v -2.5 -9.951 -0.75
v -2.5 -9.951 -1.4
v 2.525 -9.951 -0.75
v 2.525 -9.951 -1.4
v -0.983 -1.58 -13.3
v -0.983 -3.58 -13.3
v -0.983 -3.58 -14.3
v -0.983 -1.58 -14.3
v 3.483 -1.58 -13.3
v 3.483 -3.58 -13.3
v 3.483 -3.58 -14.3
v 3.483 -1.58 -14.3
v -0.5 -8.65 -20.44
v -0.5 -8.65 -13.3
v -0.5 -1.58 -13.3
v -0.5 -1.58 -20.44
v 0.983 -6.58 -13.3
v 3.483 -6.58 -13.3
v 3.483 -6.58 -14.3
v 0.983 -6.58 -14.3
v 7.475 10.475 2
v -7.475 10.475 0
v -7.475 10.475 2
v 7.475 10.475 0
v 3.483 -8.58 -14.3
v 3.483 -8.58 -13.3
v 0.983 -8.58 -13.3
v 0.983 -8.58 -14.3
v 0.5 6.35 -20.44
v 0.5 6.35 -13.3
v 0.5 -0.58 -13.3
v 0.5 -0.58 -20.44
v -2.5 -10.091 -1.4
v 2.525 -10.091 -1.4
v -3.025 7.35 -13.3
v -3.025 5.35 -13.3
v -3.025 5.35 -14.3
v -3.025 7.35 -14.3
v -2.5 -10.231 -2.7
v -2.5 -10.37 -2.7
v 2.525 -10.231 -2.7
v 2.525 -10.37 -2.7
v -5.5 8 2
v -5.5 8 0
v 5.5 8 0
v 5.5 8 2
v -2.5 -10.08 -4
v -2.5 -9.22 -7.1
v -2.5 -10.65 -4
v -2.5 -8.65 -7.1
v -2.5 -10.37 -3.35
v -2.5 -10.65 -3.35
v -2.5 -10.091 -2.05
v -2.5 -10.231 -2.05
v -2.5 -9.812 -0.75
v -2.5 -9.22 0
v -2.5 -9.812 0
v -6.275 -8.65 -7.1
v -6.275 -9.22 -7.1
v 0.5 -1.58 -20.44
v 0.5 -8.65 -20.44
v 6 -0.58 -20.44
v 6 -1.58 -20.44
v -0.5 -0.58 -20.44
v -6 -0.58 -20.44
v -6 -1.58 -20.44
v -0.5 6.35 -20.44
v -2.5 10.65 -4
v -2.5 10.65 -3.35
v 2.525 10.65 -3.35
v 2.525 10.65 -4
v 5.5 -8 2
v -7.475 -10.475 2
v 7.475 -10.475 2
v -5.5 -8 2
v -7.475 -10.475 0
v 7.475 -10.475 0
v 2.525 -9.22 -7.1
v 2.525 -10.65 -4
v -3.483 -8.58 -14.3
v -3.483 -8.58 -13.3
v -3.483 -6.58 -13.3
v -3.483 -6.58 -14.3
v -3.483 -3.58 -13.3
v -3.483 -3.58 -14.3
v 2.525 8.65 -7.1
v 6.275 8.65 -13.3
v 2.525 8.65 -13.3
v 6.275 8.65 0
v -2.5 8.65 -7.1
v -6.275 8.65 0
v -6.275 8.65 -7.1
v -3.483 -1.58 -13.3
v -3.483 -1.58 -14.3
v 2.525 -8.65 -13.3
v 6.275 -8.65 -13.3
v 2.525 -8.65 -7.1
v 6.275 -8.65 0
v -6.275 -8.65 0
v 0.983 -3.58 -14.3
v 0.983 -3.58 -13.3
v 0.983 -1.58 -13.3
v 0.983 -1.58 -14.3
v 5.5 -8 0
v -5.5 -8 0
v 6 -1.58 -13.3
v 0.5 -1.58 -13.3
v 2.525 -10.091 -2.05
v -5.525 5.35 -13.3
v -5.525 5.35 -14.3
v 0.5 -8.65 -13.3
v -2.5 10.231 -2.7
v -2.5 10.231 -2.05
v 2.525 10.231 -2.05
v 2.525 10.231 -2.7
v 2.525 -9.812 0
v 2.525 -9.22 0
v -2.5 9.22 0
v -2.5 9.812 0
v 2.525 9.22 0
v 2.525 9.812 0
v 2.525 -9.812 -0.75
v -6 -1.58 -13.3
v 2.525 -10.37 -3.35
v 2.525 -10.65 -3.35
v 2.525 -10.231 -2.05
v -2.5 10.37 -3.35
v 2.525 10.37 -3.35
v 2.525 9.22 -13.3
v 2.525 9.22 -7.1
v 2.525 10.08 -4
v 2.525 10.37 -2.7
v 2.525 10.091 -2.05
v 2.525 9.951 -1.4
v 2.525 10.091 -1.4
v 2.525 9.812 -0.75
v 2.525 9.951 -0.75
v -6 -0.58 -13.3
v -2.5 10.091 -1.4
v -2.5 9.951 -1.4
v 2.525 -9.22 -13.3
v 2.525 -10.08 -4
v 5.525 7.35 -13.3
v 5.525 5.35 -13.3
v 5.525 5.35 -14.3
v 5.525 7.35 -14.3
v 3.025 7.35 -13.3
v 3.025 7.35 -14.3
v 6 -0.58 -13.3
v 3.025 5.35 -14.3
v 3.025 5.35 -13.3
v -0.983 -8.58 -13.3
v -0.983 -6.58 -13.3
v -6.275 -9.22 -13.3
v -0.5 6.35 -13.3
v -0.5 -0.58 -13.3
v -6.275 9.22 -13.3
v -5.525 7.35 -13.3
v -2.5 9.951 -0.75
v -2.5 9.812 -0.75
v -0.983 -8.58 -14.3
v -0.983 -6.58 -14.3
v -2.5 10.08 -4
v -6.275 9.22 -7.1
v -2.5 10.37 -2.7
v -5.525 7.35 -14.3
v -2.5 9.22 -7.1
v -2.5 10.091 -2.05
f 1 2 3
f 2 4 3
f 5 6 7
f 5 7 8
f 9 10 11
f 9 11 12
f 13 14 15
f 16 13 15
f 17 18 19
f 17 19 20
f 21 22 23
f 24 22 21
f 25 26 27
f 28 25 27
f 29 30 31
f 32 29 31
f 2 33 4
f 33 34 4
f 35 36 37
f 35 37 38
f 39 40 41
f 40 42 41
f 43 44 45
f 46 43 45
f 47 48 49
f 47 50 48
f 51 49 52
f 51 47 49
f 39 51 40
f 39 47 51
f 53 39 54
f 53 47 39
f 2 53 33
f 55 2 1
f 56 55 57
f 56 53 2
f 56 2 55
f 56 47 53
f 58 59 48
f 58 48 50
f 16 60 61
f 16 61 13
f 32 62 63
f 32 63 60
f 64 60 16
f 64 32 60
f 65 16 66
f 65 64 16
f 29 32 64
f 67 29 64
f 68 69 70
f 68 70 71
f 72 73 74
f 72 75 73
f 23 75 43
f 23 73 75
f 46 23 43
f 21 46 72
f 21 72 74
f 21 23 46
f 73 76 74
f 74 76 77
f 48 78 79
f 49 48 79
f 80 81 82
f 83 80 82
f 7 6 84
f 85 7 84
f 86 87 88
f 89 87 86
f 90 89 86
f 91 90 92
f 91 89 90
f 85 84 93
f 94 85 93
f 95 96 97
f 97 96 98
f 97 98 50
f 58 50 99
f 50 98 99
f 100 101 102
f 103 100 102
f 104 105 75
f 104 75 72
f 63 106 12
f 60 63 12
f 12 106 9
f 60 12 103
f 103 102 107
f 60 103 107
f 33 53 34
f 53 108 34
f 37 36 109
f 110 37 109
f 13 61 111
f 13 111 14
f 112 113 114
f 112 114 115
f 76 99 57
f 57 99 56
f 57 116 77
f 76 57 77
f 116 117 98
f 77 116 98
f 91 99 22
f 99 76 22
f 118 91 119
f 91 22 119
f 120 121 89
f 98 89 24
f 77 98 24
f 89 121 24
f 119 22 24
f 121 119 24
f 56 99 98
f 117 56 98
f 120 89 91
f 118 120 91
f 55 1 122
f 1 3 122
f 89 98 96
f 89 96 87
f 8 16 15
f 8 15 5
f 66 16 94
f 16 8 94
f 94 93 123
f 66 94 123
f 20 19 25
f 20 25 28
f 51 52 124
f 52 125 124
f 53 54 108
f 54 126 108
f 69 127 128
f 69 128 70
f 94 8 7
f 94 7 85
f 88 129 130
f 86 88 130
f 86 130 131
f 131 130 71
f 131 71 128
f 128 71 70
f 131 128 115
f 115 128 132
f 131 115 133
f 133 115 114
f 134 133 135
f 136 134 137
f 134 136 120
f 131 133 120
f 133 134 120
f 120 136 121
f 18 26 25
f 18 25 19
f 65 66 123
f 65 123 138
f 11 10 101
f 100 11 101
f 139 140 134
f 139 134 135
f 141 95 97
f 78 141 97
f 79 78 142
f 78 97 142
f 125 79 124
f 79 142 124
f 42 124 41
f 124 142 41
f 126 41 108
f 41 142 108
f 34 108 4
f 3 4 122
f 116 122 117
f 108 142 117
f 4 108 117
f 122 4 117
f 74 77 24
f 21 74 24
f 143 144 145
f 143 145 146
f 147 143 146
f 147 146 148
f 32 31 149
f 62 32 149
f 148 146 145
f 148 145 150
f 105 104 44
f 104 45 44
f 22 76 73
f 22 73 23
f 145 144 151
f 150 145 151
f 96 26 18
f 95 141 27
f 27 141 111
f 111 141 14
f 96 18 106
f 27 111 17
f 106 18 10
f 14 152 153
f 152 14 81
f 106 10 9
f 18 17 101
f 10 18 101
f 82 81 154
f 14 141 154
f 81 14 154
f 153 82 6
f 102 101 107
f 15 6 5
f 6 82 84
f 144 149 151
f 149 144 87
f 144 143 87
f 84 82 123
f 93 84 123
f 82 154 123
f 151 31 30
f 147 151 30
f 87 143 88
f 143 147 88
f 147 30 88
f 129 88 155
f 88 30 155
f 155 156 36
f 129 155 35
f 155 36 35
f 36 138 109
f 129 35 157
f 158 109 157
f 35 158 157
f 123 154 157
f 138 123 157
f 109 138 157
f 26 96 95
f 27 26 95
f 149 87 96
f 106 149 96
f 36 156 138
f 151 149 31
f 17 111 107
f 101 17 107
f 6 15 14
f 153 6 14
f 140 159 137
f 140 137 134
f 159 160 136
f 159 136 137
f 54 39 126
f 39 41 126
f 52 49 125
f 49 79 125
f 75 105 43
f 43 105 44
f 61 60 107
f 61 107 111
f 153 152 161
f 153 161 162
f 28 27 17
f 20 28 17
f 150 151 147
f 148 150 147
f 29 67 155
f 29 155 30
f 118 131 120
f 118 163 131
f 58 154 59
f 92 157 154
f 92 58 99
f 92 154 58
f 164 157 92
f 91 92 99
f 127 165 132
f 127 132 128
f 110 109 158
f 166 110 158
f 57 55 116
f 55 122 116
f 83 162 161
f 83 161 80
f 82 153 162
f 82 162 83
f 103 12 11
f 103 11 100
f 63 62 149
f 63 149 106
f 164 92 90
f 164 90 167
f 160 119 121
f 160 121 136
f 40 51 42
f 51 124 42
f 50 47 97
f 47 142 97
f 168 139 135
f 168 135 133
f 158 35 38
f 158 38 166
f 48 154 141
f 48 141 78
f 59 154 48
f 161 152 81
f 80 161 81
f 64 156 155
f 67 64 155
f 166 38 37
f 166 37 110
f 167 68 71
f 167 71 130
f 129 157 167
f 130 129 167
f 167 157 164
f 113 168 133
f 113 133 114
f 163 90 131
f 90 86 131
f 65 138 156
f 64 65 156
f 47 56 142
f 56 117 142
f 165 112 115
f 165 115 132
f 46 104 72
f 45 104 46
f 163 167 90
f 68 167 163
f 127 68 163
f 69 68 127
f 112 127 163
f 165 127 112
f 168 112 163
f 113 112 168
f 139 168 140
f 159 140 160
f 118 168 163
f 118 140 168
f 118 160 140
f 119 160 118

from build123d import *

# Parameters (mm, degrees)
SKETCH1_W                = 14.95
SKETCH1_H                = 20.95
SKETCH1_W_2              = 11
SKETCH1_H_2              = 16
BOSS_EXTRUDE1_DEPTH      = 2
SKETCH2_W                = 12.55
SKETCH2_H                = 17.3
BOSS_EXTRUDE2_DEPTH      = 13.3
SKETCH3_W                = 6.2
SKETCH3_H                = 18.44
BOSS_EXTRUDE3_DEPTH      = 8.8
BOSS_EXTRUDE4_DEPTH      = 2.525
BOSS_EXTRUDE4_DEPTH_BACK = 2.5
BOSS_EXTRUDE5_DEPTH      = 7.14
SKETCH6_W                = 2.5
SKETCH6_H                = 2
BOSS_EXTRUDE6_DEPTH      = 1


with BuildPart() as part:
    # Sketch1 → Boss-Extrude1 (new body)
    with BuildSketch(Plane.XY):
        Rectangle(SKETCH1_W, SKETCH1_H)
        Rectangle(SKETCH1_W_2, SKETCH1_H_2, mode=Mode.SUBTRACT)
    extrude(amount=BOSS_EXTRUDE1_DEPTH)

    # Sketch2 → Boss-Extrude2 (add)
    with BuildSketch(Plane(origin=(0, 0, 0), x_dir=(-1, 0, 0), z_dir=(0, 0, -1))):
        Rectangle(SKETCH2_W, SKETCH2_H)
    extrude(amount=BOSS_EXTRUDE2_DEPTH)

    # Sketch3 → Boss-Extrude3 (add)
    with BuildSketch(Plane.ZY.offset(6.275)):
        with Locations((-10.2, 0)):
            Rectangle(SKETCH3_W, SKETCH3_H)
    extrude(amount=-BOSS_EXTRUDE3_DEPTH)

    # Sketch4 → Boss-Extrude4 (add, two sides)
    with BuildSketch(Plane(origin=(0, 0, 0), x_dir=(0, 0, -1), z_dir=(1, 0, 0))) as boss_extrude4_sk:
        Polygon((7.1, -9.22), (4, -10.65), (3.35, -10.65), (3.35, -10.3705), (2.7, -10.3705), (2.7, -10.23075), (2.05, -10.23075), (2.05, -10.091), (1.4, -10.091), (1.4, -9.95125), (0.75, -9.95125), (0.75, -9.8115), (0, -9.8115), (0, -9.22), (4, -10.08), (7.1, -8.65), align=None)
        Polygon((7.1, 9.22), (7.1, 8.65), (4, 10.08), (0, 9.22), (0, 9.8115), (0.75, 9.8115), (0.75, 9.95125), (1.4, 9.95125), (1.4, 10.091), (2.05, 10.091), (2.05, 10.23075), (2.7, 10.23075), (2.7, 10.3705), (3.35, 10.3705), (3.35, 10.65), (4, 10.65), align=None)
    extrude(amount=BOSS_EXTRUDE4_DEPTH)
    extrude(boss_extrude4_sk.sketch, amount=-BOSS_EXTRUDE4_DEPTH_BACK)

    # Sketch5 → Boss-Extrude5 (add)
    with BuildSketch(Plane(origin=(0, 0, -13.3), x_dir=(-1, 0, 0), z_dir=(0, 0, -1))):
        Polygon((0.5, 6.35), (-0.5, 6.35), (-0.5, -0.58), (-6, -0.58), (-6, -1.58), (-0.5, -1.58), (-0.5, -8.65), (0.5, -8.65), (0.5, -1.58), (6, -1.58), (6, -0.58), (0.5, -0.58), align=None)
    extrude(amount=BOSS_EXTRUDE5_DEPTH)

    # Sketch6 → Boss-Extrude6 (add)
    with BuildSketch(Plane(origin=(0, 0, -13.3), x_dir=(-1, 0, 0), z_dir=(0, 0, -1))):
        with Locations((2.232930788, -2.58)):
            Rectangle(SKETCH6_W, SKETCH6_H)
        with Locations((2.232930788, -7.58)):
            Rectangle(SKETCH6_W, SKETCH6_H)
        with Locations((-2.232930788, -7.58)):
            Rectangle(SKETCH6_W, SKETCH6_H)
        with Locations((-2.232930788, -2.58)):
            Rectangle(SKETCH6_W, SKETCH6_H)
        with Locations((4.275, 6.35)):
            Rectangle(SKETCH6_W, SKETCH6_H)
        with Locations((-4.275, 6.35)):
            Rectangle(SKETCH6_W, SKETCH6_H)
    extrude(amount=BOSS_EXTRUDE6_DEPTH)


solid = part.part
